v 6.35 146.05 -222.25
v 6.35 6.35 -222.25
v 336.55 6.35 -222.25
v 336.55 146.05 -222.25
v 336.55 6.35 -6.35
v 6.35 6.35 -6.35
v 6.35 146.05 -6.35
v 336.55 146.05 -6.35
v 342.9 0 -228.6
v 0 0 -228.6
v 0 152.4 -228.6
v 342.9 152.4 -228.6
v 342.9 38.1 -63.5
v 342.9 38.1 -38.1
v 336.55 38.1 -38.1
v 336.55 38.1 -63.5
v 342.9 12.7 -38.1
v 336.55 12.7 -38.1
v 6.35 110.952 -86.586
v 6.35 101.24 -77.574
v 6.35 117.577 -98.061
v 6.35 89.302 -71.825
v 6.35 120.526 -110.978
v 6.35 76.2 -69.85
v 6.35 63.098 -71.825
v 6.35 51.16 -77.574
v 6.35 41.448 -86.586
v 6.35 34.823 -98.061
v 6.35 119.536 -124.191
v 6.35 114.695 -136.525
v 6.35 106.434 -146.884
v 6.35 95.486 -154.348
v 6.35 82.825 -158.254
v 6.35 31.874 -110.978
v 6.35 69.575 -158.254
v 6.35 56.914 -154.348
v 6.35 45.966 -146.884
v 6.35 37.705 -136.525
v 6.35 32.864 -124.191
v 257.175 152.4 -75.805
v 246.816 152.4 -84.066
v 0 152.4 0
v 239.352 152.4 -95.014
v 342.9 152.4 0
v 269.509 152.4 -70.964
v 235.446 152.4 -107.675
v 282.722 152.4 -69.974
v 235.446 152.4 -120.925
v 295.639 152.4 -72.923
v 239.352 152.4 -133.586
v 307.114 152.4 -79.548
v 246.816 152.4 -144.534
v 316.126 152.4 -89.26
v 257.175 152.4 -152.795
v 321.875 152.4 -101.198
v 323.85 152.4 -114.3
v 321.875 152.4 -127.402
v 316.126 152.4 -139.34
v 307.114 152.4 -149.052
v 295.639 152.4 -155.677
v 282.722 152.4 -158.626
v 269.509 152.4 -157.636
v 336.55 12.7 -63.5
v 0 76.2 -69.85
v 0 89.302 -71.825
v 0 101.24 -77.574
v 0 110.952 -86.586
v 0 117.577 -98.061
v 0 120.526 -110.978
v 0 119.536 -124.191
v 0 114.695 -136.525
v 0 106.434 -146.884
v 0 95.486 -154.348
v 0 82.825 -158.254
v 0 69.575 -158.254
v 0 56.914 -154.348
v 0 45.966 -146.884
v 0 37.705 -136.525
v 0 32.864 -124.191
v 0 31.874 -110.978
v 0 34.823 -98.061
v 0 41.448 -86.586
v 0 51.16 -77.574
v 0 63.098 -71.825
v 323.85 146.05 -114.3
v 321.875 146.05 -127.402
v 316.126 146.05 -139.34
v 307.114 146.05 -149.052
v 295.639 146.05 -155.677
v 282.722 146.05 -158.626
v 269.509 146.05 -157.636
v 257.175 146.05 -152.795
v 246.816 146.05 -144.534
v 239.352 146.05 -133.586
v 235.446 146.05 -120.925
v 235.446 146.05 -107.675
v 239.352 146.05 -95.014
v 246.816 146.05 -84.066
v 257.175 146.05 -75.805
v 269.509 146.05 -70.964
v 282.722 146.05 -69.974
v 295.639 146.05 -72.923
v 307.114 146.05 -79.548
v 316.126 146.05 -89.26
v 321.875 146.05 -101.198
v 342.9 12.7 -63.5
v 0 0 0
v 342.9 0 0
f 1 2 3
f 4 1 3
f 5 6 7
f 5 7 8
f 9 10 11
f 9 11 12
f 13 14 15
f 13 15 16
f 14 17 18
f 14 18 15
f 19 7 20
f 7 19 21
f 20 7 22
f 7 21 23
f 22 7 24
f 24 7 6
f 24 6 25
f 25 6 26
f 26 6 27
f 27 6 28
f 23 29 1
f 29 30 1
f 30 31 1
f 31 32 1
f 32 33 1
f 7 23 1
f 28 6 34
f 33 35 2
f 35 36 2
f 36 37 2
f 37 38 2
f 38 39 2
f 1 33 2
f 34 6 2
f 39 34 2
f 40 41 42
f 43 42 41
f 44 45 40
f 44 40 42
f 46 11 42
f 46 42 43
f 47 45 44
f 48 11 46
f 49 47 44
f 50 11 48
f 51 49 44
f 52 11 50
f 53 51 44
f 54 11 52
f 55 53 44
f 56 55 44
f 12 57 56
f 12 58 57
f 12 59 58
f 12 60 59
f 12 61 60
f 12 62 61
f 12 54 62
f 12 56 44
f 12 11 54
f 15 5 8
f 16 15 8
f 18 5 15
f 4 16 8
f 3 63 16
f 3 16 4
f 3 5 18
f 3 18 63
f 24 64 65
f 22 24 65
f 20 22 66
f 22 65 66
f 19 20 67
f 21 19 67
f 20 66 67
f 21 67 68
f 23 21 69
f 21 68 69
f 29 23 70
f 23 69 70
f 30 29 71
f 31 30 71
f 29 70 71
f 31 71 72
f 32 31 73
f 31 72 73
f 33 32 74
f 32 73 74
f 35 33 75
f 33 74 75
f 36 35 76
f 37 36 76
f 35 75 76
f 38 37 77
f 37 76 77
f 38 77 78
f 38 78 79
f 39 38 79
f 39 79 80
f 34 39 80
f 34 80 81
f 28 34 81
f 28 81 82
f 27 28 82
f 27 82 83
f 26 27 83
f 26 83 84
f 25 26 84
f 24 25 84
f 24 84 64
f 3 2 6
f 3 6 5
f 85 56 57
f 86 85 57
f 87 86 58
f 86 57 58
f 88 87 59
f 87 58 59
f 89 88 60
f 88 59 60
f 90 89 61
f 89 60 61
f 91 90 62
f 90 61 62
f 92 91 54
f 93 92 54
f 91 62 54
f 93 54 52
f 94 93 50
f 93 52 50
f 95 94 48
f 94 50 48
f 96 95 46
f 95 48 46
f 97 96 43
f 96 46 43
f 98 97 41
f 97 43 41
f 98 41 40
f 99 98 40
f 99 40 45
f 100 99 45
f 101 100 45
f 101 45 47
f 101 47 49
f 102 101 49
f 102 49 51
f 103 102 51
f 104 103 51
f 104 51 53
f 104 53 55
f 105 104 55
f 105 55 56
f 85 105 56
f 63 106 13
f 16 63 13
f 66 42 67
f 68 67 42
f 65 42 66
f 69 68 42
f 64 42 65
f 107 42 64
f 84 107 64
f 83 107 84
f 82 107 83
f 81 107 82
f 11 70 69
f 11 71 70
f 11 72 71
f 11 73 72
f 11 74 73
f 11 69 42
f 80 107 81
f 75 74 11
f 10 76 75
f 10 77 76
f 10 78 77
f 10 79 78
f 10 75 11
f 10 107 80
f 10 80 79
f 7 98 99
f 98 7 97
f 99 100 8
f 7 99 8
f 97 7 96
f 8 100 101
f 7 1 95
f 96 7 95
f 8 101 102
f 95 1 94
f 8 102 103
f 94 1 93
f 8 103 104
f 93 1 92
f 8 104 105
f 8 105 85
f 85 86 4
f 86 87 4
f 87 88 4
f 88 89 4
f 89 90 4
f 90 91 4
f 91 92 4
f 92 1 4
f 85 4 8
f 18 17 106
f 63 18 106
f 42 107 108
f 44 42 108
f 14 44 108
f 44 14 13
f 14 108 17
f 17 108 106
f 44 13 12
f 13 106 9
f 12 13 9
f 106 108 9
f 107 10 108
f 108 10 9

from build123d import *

# Parameters (mm, degrees)
SKETCH1_W             = 342.9
SKETCH1_H             = 228.6
MAIN_BOX_DEPTH        = 152.4
SHELL1_T              = 6.35
TOP_HOLE_REACH        = 154.4
SKETCH2_R             = 44.45
SIDE_HOLE_REACH       = 344.9
SKETCH3_R             = 44.45
POWER_CORD_HOLE_REACH = 344.9
SKETCH4_W             = 25.4
SKETCH4_H             = 25.4


with BuildPart() as part:
    # Sketch1 → main box (new body)
    with BuildSketch(Plane(origin=(0, 0, 0), x_dir=(1, 0, 0), z_dir=(0, 1, 0))):
        with Locations((171.45, 114.3)):
            Rectangle(SKETCH1_W, SKETCH1_H)
    extrude(amount=MAIN_BOX_DEPTH)

    # Shell1 (no face opened: a closed hollow body)
    add(offset(amount=-SHELL1_T, mode=Mode.PRIVATE), mode=Mode.SUBTRACT)

    # Sketch2 → top hole (cut, up to next)
    with BuildSketch(Plane(origin=(0, 152.4, 0), x_dir=(1, 0, 0), z_dir=(0, 1, 0)), mode=Mode.PRIVATE) as top_hole_sk1:
        with Locations((279.4, 114.3)):
            Circle(SKETCH2_R)
    top_hole_tool1 = extrude(top_hole_sk1.sketch, amount=-TOP_HOLE_REACH, mode=Mode.PRIVATE) & part.part
    add(top_hole_tool1.solids().sort_by_distance((279.4, 152.4, -114.3))[0], mode=Mode.SUBTRACT)

    # Sketch3 → side hole (cut, up to next)
    with BuildSketch(Plane.ZY, mode=Mode.PRIVATE) as side_hole_sk1:
        with Locations((-114.3, 76.2)):
            Circle(SKETCH3_R)
    side_hole_tool1 = extrude(side_hole_sk1.sketch, amount=-SIDE_HOLE_REACH, mode=Mode.PRIVATE) & part.part
    add(side_hole_tool1.solids().sort_by_distance((0, 76.2, -114.3))[0], mode=Mode.SUBTRACT)

    # Sketch4 → power cord hole (cut, up to next)
    with BuildSketch(Plane(origin=(342.9, 0, 0), x_dir=(0, 0, -1), z_dir=(1, 0, 0)), mode=Mode.PRIVATE) as power_cord_hole_sk1:
        with Locations((50.8, 25.4)):
            Rectangle(SKETCH4_W, SKETCH4_H)
    power_cord_hole_tool1 = extrude(power_cord_hole_sk1.sketch, amount=-POWER_CORD_HOLE_REACH, mode=Mode.PRIVATE) & part.part
    add(power_cord_hole_tool1.solids().sort_by_distance((342.9, 25.4, -50.8))[0], mode=Mode.SUBTRACT)


solid = part.part
